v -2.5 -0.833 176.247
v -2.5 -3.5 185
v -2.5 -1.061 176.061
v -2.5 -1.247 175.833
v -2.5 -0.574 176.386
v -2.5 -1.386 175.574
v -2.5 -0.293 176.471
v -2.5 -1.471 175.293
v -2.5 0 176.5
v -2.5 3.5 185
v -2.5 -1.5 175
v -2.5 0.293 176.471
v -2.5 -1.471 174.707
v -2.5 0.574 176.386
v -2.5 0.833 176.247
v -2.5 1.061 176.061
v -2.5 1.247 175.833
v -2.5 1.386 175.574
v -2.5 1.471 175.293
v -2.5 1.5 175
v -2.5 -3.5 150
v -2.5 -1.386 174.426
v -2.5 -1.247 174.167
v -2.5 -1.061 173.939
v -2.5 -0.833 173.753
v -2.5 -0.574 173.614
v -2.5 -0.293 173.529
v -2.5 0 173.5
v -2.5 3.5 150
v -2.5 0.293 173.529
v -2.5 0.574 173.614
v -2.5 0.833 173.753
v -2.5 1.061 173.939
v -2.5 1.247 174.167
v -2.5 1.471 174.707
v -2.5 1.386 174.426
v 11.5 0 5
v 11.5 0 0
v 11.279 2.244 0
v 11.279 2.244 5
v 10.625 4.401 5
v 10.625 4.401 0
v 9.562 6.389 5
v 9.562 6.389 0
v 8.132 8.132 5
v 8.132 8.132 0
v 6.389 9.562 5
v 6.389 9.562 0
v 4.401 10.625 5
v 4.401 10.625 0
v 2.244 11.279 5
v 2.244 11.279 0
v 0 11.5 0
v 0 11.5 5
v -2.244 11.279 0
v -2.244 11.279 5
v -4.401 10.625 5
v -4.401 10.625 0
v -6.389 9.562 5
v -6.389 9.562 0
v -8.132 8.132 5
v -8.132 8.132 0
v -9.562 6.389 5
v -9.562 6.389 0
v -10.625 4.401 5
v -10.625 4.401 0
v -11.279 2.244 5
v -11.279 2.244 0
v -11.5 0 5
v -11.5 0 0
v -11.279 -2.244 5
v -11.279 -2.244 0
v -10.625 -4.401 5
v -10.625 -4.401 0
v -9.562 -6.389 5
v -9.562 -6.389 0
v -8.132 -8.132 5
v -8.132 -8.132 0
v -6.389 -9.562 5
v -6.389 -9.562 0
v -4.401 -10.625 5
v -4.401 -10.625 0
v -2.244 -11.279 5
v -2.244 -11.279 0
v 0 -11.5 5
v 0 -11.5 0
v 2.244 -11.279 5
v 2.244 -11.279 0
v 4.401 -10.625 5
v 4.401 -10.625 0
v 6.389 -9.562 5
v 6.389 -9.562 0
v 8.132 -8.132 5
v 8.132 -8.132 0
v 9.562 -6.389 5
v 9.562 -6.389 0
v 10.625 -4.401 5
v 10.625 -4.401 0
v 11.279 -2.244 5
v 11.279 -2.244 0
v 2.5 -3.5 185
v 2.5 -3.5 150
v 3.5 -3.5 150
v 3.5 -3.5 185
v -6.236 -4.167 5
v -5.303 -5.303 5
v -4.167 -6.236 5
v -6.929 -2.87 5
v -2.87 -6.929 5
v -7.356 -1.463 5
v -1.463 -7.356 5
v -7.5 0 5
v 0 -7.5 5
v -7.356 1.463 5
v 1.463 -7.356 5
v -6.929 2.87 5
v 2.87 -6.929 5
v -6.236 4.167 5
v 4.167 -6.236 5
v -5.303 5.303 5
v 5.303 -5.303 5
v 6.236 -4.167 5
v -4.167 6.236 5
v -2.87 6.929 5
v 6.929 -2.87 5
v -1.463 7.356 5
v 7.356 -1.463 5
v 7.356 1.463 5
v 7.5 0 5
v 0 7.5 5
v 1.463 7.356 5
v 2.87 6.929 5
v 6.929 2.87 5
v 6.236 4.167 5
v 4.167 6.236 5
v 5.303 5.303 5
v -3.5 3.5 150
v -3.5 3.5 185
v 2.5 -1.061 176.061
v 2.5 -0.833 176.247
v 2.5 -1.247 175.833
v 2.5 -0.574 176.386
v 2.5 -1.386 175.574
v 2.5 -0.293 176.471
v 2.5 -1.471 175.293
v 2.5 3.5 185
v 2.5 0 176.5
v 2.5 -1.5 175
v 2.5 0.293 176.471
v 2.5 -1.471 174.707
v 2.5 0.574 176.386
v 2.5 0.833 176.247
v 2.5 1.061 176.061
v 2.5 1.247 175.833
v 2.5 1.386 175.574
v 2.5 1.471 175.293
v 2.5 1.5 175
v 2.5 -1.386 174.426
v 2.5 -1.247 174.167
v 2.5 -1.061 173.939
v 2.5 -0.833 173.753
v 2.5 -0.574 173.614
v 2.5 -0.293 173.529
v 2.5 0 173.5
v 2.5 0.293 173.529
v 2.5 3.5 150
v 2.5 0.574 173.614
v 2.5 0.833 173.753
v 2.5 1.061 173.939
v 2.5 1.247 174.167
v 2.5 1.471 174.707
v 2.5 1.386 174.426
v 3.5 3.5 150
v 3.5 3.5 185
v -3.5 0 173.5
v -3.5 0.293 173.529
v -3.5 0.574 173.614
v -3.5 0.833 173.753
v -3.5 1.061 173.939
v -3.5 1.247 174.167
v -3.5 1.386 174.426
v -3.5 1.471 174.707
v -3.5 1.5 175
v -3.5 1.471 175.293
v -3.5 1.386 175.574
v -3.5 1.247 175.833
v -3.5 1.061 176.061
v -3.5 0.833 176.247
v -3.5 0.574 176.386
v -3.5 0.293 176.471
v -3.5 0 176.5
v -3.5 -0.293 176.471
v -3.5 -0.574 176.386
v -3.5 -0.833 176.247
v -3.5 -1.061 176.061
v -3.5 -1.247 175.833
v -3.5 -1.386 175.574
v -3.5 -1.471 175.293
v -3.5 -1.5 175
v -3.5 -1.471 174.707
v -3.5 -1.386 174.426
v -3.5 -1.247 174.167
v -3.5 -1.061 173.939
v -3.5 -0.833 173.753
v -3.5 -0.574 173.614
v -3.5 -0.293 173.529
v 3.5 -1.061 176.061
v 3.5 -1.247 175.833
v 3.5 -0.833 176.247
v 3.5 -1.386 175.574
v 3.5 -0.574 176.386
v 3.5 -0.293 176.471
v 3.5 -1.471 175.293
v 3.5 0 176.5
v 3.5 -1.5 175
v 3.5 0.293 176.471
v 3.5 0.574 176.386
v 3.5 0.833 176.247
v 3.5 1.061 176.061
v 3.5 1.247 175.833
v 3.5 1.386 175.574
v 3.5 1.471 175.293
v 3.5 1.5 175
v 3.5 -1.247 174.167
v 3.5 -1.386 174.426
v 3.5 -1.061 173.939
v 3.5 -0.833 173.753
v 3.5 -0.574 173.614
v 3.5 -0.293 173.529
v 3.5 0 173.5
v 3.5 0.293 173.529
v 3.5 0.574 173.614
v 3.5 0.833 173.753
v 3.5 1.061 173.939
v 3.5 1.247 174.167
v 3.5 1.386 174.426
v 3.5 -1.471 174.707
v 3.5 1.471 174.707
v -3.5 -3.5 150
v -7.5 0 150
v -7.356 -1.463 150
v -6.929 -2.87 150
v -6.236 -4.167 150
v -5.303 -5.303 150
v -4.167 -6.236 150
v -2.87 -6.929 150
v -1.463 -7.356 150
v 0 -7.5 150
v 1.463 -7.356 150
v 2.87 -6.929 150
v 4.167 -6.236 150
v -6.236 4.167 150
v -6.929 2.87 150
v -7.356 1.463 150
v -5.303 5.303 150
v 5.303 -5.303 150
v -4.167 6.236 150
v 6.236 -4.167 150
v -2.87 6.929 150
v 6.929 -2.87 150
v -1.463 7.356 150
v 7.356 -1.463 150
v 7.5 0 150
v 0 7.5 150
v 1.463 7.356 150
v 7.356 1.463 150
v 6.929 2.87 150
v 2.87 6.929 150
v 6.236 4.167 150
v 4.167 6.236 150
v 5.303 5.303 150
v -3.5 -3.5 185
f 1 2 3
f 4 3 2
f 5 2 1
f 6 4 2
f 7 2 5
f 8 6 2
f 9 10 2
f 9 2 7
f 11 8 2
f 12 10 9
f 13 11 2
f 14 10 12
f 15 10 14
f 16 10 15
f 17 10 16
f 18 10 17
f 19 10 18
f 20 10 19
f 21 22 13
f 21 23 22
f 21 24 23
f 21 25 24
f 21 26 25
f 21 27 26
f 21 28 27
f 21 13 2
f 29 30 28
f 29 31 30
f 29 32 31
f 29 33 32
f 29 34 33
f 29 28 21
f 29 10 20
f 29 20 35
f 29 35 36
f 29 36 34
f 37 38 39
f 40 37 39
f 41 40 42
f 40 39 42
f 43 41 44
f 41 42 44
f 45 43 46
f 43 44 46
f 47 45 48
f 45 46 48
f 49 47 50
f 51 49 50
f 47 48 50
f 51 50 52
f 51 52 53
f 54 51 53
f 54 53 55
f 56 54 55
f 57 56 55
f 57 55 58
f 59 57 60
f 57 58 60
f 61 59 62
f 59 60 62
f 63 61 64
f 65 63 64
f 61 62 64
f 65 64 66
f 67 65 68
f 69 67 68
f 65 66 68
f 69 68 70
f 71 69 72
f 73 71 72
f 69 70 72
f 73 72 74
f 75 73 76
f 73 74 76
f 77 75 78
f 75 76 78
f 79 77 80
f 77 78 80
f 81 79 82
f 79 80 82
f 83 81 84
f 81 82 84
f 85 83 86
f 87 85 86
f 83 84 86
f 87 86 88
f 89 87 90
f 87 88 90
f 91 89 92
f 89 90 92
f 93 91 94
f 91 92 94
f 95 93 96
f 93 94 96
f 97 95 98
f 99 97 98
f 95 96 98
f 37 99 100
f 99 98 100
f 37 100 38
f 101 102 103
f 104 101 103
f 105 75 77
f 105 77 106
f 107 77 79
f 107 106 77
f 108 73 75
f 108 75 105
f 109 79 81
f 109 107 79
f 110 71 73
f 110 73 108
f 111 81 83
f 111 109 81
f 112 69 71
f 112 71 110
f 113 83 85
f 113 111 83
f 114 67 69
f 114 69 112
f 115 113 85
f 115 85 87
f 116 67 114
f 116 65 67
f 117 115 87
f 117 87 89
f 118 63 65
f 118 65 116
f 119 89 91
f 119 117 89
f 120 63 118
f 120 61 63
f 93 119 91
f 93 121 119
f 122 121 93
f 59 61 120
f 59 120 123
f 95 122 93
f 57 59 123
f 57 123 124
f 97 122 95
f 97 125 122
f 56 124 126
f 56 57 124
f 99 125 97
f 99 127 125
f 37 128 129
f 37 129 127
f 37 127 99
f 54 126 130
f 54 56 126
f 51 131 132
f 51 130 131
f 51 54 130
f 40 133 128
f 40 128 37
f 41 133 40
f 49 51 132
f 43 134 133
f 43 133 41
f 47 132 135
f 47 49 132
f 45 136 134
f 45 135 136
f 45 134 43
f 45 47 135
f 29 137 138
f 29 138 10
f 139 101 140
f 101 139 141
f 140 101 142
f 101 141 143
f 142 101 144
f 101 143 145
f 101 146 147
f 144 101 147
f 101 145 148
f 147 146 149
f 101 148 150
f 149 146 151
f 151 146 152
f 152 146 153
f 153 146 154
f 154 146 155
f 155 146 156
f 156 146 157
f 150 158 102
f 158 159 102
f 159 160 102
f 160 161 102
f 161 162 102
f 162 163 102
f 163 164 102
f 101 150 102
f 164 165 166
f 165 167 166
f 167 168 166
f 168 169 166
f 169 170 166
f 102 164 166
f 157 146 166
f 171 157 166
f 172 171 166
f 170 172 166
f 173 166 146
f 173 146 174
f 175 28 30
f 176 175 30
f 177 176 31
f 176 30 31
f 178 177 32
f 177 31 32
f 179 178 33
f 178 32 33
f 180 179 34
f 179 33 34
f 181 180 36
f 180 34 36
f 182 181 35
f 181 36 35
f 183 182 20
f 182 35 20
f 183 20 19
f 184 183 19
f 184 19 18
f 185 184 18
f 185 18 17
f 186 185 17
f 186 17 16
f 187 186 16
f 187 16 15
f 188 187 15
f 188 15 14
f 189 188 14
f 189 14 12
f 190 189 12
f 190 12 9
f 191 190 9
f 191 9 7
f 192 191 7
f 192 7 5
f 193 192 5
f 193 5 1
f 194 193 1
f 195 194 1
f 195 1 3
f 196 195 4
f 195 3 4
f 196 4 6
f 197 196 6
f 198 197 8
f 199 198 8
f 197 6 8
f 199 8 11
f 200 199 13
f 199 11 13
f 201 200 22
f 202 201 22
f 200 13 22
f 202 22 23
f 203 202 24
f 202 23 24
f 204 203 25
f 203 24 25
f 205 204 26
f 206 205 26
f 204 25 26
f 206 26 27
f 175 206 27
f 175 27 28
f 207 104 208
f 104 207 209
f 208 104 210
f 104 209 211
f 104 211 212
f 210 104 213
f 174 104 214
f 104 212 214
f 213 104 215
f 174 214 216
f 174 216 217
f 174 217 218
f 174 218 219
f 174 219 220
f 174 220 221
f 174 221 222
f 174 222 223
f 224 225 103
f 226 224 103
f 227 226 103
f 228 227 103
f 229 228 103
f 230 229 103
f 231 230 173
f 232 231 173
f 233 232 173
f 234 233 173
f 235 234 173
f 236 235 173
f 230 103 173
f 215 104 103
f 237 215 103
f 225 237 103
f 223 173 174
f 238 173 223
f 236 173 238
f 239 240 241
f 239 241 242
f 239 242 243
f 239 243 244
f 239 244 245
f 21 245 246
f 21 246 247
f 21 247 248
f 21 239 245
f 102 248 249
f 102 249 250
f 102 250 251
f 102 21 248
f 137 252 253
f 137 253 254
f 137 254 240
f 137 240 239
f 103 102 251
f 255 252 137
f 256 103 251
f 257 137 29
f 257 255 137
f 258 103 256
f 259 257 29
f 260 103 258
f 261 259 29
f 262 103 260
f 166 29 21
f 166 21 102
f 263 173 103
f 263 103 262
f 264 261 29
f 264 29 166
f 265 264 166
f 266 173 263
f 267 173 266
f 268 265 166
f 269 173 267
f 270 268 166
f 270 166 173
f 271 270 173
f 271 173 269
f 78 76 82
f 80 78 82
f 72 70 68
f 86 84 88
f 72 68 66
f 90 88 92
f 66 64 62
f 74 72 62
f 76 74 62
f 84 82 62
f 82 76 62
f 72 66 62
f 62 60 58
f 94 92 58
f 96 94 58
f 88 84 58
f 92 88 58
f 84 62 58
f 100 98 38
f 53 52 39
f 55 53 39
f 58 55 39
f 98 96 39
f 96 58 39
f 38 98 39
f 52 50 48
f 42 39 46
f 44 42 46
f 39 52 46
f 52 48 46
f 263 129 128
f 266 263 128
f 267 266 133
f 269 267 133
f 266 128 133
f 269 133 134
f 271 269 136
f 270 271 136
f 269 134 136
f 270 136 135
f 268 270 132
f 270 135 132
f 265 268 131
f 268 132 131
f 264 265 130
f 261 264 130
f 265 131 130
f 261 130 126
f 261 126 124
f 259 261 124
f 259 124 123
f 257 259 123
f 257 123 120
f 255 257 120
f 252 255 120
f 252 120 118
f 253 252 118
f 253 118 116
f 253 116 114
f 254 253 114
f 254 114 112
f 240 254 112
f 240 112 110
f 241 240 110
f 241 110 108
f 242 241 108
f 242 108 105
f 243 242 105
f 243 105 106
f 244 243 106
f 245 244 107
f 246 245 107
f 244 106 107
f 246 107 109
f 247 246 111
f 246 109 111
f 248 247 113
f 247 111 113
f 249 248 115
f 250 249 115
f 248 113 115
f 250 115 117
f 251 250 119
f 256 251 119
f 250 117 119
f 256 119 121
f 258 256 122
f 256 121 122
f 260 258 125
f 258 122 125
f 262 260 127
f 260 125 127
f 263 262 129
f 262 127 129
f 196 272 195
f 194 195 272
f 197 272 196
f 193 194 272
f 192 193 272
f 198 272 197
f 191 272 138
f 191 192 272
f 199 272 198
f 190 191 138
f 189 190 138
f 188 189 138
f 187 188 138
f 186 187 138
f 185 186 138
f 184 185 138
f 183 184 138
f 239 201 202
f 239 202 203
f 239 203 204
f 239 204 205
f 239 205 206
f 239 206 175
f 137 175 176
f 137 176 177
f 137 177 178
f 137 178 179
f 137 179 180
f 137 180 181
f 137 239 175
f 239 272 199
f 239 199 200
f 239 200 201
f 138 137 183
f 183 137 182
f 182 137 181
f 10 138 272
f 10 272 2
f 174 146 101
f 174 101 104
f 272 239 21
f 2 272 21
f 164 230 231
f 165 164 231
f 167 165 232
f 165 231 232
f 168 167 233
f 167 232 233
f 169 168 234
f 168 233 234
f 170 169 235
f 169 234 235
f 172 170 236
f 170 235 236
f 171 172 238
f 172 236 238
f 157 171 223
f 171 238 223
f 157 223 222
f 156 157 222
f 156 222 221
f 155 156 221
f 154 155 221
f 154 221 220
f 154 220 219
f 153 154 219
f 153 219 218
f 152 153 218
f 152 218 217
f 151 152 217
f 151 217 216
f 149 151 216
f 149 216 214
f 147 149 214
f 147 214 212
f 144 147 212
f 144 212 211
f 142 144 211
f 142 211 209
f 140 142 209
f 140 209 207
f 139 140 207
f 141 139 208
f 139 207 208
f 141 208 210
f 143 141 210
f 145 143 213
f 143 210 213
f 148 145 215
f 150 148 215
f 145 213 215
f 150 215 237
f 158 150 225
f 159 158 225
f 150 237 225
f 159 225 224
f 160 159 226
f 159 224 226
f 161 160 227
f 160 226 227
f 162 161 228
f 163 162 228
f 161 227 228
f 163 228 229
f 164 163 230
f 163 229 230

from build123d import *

# Parameters (mm, degrees)
SKETCH1_R           = 7.5
BOSS_EXTRUDE2_DEPTH = 150
SKETCH1_4_R         = 11.5
SKETCH1_4_R_2       = 7.5
BOSS_EXTRUDE3_DEPTH = 5
SKETCH3_W           = 7
SKETCH3_H           = 7
BOSS_EXTRUDE4_DEPTH = 35
SKETCH7_W           = 5
SKETCH7_H           = 35
CUT_EXTRUDE2_DEPTH  = 10
SKETCH8_R           = 1.5
CUT_EXTRUDE3_DEPTH  = 10


with BuildPart() as part:
    # Sketch1 → Boss-Extrude2 (new body)
    with BuildSketch(Plane.XY):
        Circle(SKETCH1_R)
    extrude(amount=BOSS_EXTRUDE2_DEPTH)

    # Sketch1<4> → Boss-Extrude3 (add)
    with BuildSketch(Plane.XY):
        Circle(SKETCH1_4_R)
        Circle(SKETCH1_4_R_2, mode=Mode.SUBTRACT)
    extrude(amount=BOSS_EXTRUDE3_DEPTH)

    # Sketch3 → Boss-Extrude4 (add)
    with BuildSketch(Plane.XY.offset(150)):
        Rectangle(SKETCH3_W, SKETCH3_H)
    extrude(amount=BOSS_EXTRUDE4_DEPTH)

    # Sketch7 → Cut-Extrude2 (cut)
    with BuildSketch(Plane(origin=(0, 3.5, 0), x_dir=(1, 0, 0), z_dir=(0, 1, 0))):
        with Locations((0, -167.5)):
            Rectangle(SKETCH7_W, SKETCH7_H)
    extrude(amount=-CUT_EXTRUDE2_DEPTH, mode=Mode.SUBTRACT)

    # Sketch8 → Cut-Extrude3 (cut)
    with BuildSketch(Plane(origin=(3.5, 0, 0), x_dir=(0, 0, -1), z_dir=(1, 0, 0))):
        with Locations((-175, 0)):
            Circle(SKETCH8_R)
    extrude(amount=-CUT_EXTRUDE3_DEPTH, mode=Mode.SUBTRACT)


solid = part.part
